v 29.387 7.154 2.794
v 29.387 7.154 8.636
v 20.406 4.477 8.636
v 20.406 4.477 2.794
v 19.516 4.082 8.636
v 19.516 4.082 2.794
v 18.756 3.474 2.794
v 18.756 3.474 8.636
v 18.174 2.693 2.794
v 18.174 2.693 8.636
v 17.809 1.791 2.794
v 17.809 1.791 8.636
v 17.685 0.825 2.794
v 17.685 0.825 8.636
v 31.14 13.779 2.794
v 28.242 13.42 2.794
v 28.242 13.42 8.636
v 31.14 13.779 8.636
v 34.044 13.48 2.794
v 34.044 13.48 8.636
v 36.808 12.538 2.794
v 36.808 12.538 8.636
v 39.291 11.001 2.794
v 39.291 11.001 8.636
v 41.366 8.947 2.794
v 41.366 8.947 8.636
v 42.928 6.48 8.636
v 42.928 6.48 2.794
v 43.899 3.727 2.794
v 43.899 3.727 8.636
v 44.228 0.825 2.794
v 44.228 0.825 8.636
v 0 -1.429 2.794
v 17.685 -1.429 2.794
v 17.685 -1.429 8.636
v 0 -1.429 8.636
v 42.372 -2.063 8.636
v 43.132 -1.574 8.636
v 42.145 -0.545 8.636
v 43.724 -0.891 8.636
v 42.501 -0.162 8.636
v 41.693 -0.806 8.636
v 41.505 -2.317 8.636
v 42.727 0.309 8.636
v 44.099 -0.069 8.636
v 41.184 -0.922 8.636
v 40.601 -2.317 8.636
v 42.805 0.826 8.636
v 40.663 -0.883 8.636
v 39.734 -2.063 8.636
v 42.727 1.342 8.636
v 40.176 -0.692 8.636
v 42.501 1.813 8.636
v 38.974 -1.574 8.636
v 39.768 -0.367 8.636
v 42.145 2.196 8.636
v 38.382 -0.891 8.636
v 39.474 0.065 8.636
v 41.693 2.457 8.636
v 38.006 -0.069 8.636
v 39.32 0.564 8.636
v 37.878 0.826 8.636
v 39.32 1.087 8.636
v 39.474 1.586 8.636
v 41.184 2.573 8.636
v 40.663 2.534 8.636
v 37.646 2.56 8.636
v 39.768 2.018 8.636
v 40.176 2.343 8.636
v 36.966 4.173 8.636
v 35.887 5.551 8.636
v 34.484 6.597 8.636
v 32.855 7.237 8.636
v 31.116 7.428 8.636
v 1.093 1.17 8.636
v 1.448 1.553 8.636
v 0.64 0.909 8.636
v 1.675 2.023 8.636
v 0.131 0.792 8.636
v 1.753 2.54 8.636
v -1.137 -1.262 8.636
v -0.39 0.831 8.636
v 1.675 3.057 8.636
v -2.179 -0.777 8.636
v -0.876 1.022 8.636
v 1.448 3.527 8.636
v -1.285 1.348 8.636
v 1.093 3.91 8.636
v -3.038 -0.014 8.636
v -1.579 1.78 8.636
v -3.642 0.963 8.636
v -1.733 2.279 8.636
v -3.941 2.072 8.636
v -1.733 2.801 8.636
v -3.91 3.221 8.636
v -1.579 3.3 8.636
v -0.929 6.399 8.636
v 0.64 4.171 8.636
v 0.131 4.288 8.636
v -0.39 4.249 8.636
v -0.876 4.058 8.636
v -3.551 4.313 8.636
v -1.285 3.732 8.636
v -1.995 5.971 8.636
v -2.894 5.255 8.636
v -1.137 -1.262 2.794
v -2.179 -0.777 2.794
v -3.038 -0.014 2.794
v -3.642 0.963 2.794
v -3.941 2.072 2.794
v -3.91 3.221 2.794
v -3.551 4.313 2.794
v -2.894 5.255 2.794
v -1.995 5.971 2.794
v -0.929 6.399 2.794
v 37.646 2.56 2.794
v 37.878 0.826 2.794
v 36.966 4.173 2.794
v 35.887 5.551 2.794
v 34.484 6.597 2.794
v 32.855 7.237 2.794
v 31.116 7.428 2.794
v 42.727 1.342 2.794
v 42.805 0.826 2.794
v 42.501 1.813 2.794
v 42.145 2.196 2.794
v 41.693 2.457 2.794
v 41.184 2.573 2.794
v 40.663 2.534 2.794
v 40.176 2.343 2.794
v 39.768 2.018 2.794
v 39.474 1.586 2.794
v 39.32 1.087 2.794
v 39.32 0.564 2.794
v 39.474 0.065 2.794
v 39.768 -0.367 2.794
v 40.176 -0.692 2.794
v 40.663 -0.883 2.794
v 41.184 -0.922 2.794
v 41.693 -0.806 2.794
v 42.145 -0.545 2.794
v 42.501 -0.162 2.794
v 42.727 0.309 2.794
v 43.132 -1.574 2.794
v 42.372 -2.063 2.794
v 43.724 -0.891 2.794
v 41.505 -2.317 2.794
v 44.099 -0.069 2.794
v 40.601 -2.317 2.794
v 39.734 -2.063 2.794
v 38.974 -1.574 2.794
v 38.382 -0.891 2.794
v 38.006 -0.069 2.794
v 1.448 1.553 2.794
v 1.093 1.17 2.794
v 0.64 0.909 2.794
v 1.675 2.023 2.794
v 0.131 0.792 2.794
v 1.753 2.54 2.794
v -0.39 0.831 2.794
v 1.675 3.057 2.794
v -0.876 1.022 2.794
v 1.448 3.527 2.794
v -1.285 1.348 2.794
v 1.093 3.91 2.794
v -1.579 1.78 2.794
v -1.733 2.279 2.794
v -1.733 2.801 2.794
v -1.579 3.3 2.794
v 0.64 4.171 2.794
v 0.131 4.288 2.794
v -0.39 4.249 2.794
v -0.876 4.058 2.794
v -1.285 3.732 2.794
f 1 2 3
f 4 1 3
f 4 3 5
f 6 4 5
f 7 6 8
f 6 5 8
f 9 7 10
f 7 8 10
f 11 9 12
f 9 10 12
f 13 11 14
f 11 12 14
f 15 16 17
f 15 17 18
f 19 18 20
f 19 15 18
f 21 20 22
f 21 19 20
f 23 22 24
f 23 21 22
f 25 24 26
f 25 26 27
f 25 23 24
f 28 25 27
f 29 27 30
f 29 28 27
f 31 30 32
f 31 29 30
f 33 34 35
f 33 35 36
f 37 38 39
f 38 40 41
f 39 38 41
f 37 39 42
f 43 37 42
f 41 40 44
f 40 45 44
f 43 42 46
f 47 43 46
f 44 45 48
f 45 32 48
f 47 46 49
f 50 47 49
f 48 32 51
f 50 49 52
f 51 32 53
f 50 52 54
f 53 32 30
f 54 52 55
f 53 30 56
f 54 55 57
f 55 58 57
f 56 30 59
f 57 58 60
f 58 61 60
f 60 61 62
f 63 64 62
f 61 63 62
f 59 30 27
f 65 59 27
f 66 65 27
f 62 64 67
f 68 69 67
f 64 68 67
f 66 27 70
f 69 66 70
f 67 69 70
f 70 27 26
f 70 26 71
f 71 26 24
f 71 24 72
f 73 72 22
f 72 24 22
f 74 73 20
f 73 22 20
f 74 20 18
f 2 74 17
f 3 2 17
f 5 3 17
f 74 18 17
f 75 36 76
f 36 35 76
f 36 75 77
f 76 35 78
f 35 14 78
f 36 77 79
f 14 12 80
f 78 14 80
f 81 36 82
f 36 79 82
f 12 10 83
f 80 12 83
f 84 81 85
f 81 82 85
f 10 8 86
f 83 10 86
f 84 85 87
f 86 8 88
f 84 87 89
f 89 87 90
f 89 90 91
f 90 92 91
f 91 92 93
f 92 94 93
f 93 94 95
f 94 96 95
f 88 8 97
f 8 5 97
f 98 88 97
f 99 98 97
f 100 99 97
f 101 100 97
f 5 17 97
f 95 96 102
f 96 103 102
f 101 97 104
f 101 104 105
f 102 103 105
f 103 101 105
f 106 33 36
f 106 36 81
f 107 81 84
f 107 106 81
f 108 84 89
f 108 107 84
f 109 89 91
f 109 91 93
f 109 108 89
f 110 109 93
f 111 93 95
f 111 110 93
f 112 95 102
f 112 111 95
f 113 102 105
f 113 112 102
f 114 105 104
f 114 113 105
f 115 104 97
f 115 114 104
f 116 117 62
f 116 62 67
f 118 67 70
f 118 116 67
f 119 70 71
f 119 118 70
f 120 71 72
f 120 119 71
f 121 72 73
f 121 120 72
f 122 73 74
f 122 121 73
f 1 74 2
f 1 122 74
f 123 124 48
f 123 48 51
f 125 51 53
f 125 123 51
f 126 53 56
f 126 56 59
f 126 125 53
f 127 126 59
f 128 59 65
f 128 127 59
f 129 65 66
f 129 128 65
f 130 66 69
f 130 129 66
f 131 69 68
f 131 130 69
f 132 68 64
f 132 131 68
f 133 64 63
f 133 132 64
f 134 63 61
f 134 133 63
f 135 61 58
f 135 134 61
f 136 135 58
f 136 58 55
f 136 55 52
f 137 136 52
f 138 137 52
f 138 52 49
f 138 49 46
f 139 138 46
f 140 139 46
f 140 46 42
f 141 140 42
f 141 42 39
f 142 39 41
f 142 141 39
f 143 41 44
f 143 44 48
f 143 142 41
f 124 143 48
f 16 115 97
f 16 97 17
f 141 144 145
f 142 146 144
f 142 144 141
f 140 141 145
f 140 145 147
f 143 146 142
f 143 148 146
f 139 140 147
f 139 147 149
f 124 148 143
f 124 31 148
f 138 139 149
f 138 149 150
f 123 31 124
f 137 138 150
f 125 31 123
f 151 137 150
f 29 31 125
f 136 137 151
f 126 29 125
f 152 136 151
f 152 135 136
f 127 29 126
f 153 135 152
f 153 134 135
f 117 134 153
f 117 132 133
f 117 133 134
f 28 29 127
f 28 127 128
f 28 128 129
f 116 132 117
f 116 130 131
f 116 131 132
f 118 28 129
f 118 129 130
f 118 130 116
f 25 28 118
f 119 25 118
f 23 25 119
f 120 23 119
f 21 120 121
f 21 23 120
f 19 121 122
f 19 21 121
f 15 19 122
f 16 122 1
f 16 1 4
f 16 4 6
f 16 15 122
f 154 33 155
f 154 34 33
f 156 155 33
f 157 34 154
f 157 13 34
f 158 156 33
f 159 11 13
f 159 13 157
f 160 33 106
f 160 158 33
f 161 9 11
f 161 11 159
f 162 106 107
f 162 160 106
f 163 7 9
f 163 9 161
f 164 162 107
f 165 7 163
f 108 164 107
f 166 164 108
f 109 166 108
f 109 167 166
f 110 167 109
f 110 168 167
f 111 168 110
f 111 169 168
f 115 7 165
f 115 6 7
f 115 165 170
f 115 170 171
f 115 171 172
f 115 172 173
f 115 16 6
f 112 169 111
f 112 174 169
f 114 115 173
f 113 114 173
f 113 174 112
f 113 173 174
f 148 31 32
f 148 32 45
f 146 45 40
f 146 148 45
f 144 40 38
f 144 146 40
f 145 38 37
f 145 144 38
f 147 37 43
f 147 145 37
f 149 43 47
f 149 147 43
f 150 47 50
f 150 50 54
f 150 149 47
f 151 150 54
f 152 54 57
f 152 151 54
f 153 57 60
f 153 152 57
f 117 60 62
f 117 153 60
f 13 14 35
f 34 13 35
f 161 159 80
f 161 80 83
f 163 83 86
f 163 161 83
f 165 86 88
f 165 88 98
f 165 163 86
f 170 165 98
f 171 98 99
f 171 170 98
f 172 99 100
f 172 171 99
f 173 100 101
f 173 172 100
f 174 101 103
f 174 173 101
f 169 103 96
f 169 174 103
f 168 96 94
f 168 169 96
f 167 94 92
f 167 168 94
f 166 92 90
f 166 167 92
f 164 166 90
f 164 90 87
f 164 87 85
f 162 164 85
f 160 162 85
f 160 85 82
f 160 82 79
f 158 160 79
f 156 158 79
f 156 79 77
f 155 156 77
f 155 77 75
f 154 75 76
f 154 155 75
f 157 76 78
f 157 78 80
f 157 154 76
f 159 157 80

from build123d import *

# Parameters (mm, degrees)
SKETCH2_R           = 1.7526
BOSS_EXTRUDE1_DEPTH = 5.842
CUT_EXTRUDE1_DEPTH  = 47.691513729


with BuildPart() as part:
    # Sketch2 → Boss-Extrude1 (new body)
    with BuildSketch(Plane.XY.offset(2.794)):
        with BuildLine():
            Line((-0.928725161, 6.398554929), (28.242391074, 13.419823287))
            ThreePointArc((28.242391074, 13.419823287), (39.290541517, 11.000821605), (44.22775, 0.8255))
            ThreePointArc((44.22775, 0.8255), (41.05275, -2.3495), (37.87775, 0.8255))
            ThreePointArc((37.87775, 0.8255), (31.27375, 7.4295), (24.66975, 0.8255))
            Line((24.66975, 0.8255), (24.66975, -1.42875))
            Line((24.66975, -1.42875), (0, -1.42875))
            ThreePointArc((0, -1.42875), (-3.941104949, 2.072380128), (-0.928725161, 6.398554929))
        make_face()
        with Locations((0, 2.54)):
            Circle(SKETCH2_R, mode=Mode.SUBTRACT)
        with Locations((41.05275, 0.8255)):
            Circle(SKETCH2_R, mode=Mode.SUBTRACT)
    extrude(amount=BOSS_EXTRUDE1_DEPTH)

    # Sketch3 → Cut-Extrude1 (cut, through all)
    with BuildSketch(Plane.XY.offset(8.636)):
        with BuildLine():
            Line((37.87775, -10.052724244), (37.87775, 0.8255))
            ThreePointArc((37.87775, 0.8255), (35.220394868, 6.120479725), (29.386892857, 7.154211253))
            Line((29.386892857, 7.154211253), (20.406178571, 4.476679569))
            ThreePointArc((20.406178571, 4.476679569), (18.439954005, 3.102410501), (17.68475, 0.8255))
            Line((17.68475, 0.8255), (17.68475, -10.052724244))
            Line((17.68475, -10.052724244), (37.87775, -10.052724244))
        make_face()
    extrude(amount=-CUT_EXTRUDE1_DEPTH, mode=Mode.SUBTRACT)


solid = part.part
